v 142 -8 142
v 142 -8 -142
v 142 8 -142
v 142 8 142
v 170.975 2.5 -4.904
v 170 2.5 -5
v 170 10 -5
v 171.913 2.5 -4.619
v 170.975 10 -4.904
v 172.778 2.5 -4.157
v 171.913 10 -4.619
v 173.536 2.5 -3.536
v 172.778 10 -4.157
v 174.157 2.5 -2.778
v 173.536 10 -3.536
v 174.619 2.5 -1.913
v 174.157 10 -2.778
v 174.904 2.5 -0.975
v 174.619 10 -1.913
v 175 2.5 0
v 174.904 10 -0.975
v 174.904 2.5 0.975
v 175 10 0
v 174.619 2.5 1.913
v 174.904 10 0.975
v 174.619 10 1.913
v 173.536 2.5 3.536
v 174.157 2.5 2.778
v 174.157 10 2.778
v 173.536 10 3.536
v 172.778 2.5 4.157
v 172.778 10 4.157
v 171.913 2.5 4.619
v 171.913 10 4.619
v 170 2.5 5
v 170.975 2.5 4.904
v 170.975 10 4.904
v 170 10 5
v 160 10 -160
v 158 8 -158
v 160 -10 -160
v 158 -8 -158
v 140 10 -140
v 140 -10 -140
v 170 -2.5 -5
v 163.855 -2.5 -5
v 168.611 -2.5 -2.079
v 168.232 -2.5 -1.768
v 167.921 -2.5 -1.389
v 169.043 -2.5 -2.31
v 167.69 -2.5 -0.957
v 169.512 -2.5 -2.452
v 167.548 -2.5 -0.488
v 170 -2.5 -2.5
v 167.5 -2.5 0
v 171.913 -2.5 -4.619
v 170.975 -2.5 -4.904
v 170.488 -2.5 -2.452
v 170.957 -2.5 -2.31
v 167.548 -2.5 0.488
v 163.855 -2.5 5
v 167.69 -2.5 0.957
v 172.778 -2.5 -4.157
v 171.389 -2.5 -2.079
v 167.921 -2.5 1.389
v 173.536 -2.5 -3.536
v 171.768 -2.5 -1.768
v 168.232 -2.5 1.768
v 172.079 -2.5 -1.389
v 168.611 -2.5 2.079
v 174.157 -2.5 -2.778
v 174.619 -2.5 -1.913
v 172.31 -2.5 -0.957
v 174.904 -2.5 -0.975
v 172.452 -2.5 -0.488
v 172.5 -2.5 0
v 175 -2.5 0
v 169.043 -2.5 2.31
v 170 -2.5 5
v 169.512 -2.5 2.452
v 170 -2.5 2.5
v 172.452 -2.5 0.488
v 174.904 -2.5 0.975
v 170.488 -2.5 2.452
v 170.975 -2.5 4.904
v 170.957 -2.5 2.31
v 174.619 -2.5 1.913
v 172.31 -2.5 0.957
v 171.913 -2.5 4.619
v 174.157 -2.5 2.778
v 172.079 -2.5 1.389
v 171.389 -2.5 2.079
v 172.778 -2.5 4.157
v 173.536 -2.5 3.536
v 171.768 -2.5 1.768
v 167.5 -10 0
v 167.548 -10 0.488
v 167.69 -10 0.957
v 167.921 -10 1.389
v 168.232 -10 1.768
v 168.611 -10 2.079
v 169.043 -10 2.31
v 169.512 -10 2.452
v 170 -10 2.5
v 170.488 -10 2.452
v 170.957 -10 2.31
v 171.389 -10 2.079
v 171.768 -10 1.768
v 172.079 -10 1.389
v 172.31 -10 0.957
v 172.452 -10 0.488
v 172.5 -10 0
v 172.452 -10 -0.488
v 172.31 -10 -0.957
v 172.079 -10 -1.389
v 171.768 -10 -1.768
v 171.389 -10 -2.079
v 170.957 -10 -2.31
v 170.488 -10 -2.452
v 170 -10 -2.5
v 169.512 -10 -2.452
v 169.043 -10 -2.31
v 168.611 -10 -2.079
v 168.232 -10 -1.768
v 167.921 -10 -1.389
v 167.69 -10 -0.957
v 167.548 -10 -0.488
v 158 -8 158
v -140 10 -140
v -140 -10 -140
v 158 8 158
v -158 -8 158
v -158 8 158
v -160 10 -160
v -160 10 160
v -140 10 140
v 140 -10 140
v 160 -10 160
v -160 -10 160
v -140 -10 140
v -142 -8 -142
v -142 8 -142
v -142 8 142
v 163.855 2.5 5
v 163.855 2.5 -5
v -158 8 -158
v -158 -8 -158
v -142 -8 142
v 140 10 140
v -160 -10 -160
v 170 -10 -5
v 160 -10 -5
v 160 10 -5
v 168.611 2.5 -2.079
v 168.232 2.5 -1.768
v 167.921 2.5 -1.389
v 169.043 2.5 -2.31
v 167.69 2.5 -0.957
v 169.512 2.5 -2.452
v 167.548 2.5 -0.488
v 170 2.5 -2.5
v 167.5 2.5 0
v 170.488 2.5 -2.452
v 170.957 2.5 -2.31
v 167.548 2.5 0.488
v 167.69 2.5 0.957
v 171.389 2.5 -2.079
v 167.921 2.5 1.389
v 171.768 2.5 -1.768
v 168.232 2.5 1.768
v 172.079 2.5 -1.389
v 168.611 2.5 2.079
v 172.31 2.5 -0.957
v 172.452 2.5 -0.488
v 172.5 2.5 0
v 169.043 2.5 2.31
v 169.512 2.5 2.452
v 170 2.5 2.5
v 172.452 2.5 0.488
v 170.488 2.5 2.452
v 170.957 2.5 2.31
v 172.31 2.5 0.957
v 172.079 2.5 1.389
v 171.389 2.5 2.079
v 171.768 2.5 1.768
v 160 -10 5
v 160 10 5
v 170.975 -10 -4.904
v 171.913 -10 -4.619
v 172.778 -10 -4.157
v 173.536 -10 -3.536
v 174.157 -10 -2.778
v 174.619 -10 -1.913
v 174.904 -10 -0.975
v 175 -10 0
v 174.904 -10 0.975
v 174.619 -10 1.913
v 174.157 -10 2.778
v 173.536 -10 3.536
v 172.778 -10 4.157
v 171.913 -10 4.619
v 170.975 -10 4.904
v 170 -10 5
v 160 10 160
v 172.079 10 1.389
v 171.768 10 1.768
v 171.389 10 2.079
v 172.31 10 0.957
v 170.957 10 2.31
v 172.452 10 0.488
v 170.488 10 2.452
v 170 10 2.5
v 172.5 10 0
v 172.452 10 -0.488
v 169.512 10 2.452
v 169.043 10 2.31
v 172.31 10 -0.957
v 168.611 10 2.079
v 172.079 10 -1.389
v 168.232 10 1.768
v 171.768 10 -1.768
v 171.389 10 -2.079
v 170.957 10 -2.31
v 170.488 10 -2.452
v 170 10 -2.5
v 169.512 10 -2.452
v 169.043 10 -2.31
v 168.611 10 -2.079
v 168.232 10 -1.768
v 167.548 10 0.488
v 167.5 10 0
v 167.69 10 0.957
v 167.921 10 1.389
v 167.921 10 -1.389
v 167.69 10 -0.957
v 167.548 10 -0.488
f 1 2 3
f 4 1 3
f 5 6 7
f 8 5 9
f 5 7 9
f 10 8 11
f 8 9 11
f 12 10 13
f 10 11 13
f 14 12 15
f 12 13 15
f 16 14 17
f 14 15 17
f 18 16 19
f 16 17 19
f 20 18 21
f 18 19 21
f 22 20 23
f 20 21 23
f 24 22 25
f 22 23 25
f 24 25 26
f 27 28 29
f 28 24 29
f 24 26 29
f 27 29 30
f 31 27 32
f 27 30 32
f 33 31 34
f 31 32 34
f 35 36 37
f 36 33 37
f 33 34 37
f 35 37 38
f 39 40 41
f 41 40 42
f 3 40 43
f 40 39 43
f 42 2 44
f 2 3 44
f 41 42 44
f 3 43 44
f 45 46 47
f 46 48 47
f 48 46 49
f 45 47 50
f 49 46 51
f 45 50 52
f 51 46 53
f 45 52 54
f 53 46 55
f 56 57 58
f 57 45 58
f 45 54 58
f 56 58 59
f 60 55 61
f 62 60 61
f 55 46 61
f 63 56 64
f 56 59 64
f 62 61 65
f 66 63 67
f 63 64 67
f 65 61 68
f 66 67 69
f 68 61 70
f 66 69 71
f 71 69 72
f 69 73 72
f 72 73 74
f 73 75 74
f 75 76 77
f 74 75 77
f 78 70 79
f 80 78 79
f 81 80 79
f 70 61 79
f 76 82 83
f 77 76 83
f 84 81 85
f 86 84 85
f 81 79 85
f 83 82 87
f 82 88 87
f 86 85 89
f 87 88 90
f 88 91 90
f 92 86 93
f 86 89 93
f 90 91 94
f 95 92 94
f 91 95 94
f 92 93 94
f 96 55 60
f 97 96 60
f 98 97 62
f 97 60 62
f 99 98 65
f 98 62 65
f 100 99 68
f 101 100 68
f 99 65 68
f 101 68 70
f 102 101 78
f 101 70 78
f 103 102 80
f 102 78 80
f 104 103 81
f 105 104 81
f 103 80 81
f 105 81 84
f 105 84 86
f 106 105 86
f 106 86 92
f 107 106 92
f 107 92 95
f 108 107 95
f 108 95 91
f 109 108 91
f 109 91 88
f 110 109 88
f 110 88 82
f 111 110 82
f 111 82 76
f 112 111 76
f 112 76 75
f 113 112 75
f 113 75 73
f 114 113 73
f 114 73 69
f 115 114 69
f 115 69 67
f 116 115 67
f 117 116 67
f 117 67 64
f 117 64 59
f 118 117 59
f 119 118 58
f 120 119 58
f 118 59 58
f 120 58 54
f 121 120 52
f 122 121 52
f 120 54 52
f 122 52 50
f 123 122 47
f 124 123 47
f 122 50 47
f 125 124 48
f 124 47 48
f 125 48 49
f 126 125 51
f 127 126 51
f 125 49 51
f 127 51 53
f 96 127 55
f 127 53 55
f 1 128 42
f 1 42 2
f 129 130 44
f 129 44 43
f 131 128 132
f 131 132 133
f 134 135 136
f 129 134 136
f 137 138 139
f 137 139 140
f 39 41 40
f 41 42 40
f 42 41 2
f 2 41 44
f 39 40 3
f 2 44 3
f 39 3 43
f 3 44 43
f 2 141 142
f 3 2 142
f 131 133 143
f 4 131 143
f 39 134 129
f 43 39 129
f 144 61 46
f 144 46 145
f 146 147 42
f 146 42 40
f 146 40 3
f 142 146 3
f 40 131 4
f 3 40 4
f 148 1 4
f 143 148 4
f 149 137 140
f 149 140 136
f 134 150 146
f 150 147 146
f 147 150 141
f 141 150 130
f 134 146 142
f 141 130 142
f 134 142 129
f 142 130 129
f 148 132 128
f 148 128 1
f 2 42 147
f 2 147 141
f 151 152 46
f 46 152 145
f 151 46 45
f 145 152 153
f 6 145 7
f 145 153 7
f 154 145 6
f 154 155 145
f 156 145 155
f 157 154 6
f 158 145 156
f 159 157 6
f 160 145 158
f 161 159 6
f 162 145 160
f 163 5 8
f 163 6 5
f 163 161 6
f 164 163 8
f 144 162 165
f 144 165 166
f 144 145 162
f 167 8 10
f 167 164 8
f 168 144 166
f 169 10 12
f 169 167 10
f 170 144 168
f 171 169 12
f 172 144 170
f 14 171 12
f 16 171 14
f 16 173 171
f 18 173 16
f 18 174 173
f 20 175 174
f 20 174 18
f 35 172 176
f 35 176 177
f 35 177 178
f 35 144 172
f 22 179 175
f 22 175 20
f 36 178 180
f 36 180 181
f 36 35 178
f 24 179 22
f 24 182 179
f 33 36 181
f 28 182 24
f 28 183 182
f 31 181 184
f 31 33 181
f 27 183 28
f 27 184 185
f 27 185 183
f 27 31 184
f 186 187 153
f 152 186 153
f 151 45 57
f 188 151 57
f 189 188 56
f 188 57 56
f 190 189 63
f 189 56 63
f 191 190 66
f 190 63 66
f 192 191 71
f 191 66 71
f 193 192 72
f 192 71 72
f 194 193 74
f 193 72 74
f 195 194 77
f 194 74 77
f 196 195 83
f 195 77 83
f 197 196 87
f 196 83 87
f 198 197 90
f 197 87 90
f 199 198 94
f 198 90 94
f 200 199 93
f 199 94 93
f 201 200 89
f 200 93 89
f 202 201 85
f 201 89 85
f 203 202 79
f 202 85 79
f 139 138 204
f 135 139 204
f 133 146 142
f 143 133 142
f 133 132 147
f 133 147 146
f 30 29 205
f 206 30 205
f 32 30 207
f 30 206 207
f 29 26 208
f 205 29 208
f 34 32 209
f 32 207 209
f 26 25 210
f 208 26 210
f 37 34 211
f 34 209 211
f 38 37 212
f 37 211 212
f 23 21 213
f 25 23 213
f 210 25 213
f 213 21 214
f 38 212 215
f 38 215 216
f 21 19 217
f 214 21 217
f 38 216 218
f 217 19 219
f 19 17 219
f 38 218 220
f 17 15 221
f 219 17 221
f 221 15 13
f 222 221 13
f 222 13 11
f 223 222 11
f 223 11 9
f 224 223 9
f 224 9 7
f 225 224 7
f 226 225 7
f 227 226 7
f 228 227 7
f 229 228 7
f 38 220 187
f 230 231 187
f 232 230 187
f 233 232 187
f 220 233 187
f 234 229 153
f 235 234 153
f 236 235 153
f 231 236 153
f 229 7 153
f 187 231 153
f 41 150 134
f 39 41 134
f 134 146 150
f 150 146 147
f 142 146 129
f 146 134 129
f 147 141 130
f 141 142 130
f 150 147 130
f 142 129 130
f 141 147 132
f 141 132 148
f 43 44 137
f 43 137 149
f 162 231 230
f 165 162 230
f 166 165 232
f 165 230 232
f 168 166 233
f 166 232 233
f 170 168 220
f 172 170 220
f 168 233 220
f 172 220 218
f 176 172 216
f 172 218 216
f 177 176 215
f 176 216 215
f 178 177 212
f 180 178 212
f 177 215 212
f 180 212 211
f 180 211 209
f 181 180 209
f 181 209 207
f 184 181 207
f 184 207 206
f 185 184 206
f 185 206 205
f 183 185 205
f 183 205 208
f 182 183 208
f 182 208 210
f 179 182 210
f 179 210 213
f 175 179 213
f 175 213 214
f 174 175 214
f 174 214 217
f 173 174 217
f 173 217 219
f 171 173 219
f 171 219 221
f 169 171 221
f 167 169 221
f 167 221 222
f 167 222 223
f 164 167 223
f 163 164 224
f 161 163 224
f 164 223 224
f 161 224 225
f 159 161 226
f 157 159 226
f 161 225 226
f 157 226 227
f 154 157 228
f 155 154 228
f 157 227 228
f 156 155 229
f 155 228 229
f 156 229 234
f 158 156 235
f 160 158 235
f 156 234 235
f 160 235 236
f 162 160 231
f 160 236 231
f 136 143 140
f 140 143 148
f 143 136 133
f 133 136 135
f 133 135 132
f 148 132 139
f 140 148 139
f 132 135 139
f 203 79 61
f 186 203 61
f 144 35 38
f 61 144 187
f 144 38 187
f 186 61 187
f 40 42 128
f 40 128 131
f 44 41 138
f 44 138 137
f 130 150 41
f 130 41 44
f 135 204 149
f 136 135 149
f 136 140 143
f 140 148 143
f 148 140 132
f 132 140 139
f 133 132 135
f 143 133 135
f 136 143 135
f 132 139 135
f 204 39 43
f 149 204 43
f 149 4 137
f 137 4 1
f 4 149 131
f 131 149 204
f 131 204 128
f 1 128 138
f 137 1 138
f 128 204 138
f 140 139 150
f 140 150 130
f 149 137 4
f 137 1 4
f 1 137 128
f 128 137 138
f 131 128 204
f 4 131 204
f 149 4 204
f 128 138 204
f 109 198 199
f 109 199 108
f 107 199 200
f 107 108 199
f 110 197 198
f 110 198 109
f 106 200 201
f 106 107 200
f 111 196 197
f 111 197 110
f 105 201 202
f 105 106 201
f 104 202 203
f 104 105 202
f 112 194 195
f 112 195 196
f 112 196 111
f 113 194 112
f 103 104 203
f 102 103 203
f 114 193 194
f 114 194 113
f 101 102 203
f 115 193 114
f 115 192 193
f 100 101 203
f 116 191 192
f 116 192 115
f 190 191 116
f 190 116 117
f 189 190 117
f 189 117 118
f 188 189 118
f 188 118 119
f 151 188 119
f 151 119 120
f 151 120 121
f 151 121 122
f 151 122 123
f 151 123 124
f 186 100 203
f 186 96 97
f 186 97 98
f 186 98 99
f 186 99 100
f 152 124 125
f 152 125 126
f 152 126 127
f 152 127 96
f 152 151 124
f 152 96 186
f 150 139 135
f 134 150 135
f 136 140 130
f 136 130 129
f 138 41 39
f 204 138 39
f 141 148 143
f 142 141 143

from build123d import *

# Parameters (mm, degrees)
TUBO_CUADRADO_20_X_20_X_2_2_DEPTH      = 315.142135624
TUBO_CUADRADO_20_X_20_X_2_2_DEPTH_BACK = 15.142135624
SKETCH1_W                              = 20
SKETCH1_H                              = 20
SKETCH1_W_2                            = 16
SKETCH1_H_2                            = 16
SKETCH1_ON_SEGMENT_2_W                 = 20
SKETCH1_ON_SEGMENT_2_H                 = 20
SKETCH1_ON_SEGMENT_2_W_2               = 16
SKETCH1_ON_SEGMENT_2_H_2               = 16
TUBO_CUADRADO_20_X_20_X_2_2_2_DEPTH    = 330.284271247
SKETCH1_ON_SEGMENT_3_W                 = 20
SKETCH1_ON_SEGMENT_3_H                 = 20
SKETCH1_ON_SEGMENT_3_W_2               = 16
SKETCH1_ON_SEGMENT_3_H_2               = 16
TUBO_CUADRADO_20_X_20_X_2_2_3_DEPTH    = 330.284271247
SKETCH1_ON_SEGMENT_4_W                 = 20
SKETCH1_ON_SEGMENT_4_H                 = 20
SKETCH1_ON_SEGMENT_4_W_2               = 16
SKETCH1_ON_SEGMENT_4_H_2               = 16
TUBO_CUADRADO_20_X_20_X_2_2_4_DEPTH    = 330.284271247
CROQUIS7_R                             = 2.5
SALIENTE_EXTRUIR1_DEPTH                = 20
CROQUIS8_W                             = 15.105602269
CROQUIS8_H                             = 5
CORTAR_EXTRUIR1_DEPTH                  = 80


with BuildPart() as part:
    # Sketch1 → Tubo cuadrado 20 X 20 X 2(2) (new, two sides: drawn at the far end of the back side and taken through both)
    with BuildSketch(Plane(origin=(-150, 0, -150), x_dir=(1, 0, 0), z_dir=(0, 0, 1)).offset(-TUBO_CUADRADO_20_X_20_X_2_2_DEPTH_BACK)):
        Rectangle(SKETCH1_W, SKETCH1_H)
        Rectangle(SKETCH1_W_2, SKETCH1_H_2, mode=Mode.SUBTRACT)
    extrude(amount=TUBO_CUADRADO_20_X_20_X_2_2_DEPTH + TUBO_CUADRADO_20_X_20_X_2_2_DEPTH_BACK)

    # Tubo cuadrado 20 X 20 X 2(2) mitre 1
    split(bisect_by=Plane(origin=(-150, 0, -150), x_dir=(0, -1, 0), z_dir=(-0.707106781, 0, 0.707106781)), keep=Keep.TOP)

    # Tubo cuadrado 20 X 20 X 2(2) mitre 2
    split(bisect_by=Plane(origin=(-150, 0, 150), x_dir=(0, -1, 0), z_dir=(-0.707106781, 0, -0.707106781)), keep=Keep.TOP)


with BuildPart() as body_2:
    # Sketch1 on segment 2 (carried to segment 2) → Tubo cuadrado 20 X 20 X 2_2 2 (new body)
    with BuildSketch(Plane(origin=(-165.142135624, 0, 150), x_dir=(0, 0, -1), z_dir=(1, 0, 0))):
        Rectangle(SKETCH1_ON_SEGMENT_2_W, SKETCH1_ON_SEGMENT_2_H)
        Rectangle(SKETCH1_ON_SEGMENT_2_W_2, SKETCH1_ON_SEGMENT_2_H_2, mode=Mode.SUBTRACT)
    extrude(amount=TUBO_CUADRADO_20_X_20_X_2_2_2_DEPTH)

    # Tubo cuadrado 20 X 20 X 2_2 2 mitre 1
    split(bisect_by=Plane(origin=(-150, 0, 150), x_dir=(0, 1, 0), z_dir=(0.707106781, 0, 0.707106781)), keep=Keep.TOP)

    # Tubo cuadrado 20 X 20 X 2_2 2 mitre 2
    split(bisect_by=Plane(origin=(150, 0, 150), x_dir=(0, -1, 0), z_dir=(-0.707106781, 0, 0.707106781)), keep=Keep.TOP)


with BuildPart() as body_3:
    # Sketch1 on segment 3 (carried to segment 3) → Tubo cuadrado 20 X 20 X 2_2 3 (new body)
    with BuildSketch(Plane(origin=(150, 0, 165.142135624), x_dir=(-1, 0, 0), z_dir=(0, 0, -1))):
        Rectangle(SKETCH1_ON_SEGMENT_3_W, SKETCH1_ON_SEGMENT_3_H)
        Rectangle(SKETCH1_ON_SEGMENT_3_W_2, SKETCH1_ON_SEGMENT_3_H_2, mode=Mode.SUBTRACT)
    extrude(amount=TUBO_CUADRADO_20_X_20_X_2_2_3_DEPTH)

    # Tubo cuadrado 20 X 20 X 2_2 3 mitre 1
    split(bisect_by=Plane(origin=(150, 0, -150), x_dir=(0, 1, 0), z_dir=(0.707106781, 0, 0.707106781)), keep=Keep.TOP)

    # Tubo cuadrado 20 X 20 X 2_2 3 mitre 2
    split(bisect_by=Plane(origin=(150, 0, 150), x_dir=(0, 1, 0), z_dir=(0.707106781, 0, -0.707106781)), keep=Keep.TOP)


with BuildPart() as body_4:
    # Sketch1 on segment 4 (carried to segment 4) → Tubo cuadrado 20 X 20 X 2_2 4 (new body)
    with BuildSketch(Plane(origin=(165.142135624, 0, -150), x_dir=(0, 0, 1), z_dir=(-1, 0, 0))):
        Rectangle(SKETCH1_ON_SEGMENT_4_W, SKETCH1_ON_SEGMENT_4_H)
        Rectangle(SKETCH1_ON_SEGMENT_4_W_2, SKETCH1_ON_SEGMENT_4_H_2, mode=Mode.SUBTRACT)
    extrude(amount=TUBO_CUADRADO_20_X_20_X_2_2_4_DEPTH)

    # Tubo cuadrado 20 X 20 X 2_2 4 mitre 1
    split(bisect_by=Plane(origin=(-150, 0, -150), x_dir=(0, 1, 0), z_dir=(0.707106781, 0, -0.707106781)), keep=Keep.TOP)

    # Tubo cuadrado 20 X 20 X 2_2 4 mitre 2
    split(bisect_by=Plane(origin=(150, 0, -150), x_dir=(0, -1, 0), z_dir=(-0.707106781, 0, -0.707106781)), keep=Keep.TOP)


with BuildPart() as body_5:
    # Croquis7 → Saliente-Extruir1 (new body)
    with BuildSketch(Plane(origin=(0, 10, 0), x_dir=(1, 0, 0), z_dir=(0, 1, 0))):
        with BuildLine():
            Line((160, 0), (160, 5))
            Line((160, 5), (170, 5))
            ThreePointArc((170, 5), (175, 0), (170, -5))
            Line((170, -5), (160, -5))
            Line((160, -5), (160, 0))
        make_face()
        with Locations(Location((170, 0, 0), (0, 0, 180))):
            Circle(CROQUIS7_R, mode=Mode.SUBTRACT)
    extrude(amount=-SALIENTE_EXTRUIR1_DEPTH)

    # Croquis8 → Cortar-Extruir1 (cut)
    with BuildSketch(Plane.XY.offset(5)):
        with Locations((171.408016387, 0)):
            Rectangle(CROQUIS8_W, CROQUIS8_H)
    extrude(amount=-CORTAR_EXTRUIR1_DEPTH, mode=Mode.SUBTRACT)


solid = Compound([part.part, body_2.part, body_3.part, body_4.part, body_5.part])
